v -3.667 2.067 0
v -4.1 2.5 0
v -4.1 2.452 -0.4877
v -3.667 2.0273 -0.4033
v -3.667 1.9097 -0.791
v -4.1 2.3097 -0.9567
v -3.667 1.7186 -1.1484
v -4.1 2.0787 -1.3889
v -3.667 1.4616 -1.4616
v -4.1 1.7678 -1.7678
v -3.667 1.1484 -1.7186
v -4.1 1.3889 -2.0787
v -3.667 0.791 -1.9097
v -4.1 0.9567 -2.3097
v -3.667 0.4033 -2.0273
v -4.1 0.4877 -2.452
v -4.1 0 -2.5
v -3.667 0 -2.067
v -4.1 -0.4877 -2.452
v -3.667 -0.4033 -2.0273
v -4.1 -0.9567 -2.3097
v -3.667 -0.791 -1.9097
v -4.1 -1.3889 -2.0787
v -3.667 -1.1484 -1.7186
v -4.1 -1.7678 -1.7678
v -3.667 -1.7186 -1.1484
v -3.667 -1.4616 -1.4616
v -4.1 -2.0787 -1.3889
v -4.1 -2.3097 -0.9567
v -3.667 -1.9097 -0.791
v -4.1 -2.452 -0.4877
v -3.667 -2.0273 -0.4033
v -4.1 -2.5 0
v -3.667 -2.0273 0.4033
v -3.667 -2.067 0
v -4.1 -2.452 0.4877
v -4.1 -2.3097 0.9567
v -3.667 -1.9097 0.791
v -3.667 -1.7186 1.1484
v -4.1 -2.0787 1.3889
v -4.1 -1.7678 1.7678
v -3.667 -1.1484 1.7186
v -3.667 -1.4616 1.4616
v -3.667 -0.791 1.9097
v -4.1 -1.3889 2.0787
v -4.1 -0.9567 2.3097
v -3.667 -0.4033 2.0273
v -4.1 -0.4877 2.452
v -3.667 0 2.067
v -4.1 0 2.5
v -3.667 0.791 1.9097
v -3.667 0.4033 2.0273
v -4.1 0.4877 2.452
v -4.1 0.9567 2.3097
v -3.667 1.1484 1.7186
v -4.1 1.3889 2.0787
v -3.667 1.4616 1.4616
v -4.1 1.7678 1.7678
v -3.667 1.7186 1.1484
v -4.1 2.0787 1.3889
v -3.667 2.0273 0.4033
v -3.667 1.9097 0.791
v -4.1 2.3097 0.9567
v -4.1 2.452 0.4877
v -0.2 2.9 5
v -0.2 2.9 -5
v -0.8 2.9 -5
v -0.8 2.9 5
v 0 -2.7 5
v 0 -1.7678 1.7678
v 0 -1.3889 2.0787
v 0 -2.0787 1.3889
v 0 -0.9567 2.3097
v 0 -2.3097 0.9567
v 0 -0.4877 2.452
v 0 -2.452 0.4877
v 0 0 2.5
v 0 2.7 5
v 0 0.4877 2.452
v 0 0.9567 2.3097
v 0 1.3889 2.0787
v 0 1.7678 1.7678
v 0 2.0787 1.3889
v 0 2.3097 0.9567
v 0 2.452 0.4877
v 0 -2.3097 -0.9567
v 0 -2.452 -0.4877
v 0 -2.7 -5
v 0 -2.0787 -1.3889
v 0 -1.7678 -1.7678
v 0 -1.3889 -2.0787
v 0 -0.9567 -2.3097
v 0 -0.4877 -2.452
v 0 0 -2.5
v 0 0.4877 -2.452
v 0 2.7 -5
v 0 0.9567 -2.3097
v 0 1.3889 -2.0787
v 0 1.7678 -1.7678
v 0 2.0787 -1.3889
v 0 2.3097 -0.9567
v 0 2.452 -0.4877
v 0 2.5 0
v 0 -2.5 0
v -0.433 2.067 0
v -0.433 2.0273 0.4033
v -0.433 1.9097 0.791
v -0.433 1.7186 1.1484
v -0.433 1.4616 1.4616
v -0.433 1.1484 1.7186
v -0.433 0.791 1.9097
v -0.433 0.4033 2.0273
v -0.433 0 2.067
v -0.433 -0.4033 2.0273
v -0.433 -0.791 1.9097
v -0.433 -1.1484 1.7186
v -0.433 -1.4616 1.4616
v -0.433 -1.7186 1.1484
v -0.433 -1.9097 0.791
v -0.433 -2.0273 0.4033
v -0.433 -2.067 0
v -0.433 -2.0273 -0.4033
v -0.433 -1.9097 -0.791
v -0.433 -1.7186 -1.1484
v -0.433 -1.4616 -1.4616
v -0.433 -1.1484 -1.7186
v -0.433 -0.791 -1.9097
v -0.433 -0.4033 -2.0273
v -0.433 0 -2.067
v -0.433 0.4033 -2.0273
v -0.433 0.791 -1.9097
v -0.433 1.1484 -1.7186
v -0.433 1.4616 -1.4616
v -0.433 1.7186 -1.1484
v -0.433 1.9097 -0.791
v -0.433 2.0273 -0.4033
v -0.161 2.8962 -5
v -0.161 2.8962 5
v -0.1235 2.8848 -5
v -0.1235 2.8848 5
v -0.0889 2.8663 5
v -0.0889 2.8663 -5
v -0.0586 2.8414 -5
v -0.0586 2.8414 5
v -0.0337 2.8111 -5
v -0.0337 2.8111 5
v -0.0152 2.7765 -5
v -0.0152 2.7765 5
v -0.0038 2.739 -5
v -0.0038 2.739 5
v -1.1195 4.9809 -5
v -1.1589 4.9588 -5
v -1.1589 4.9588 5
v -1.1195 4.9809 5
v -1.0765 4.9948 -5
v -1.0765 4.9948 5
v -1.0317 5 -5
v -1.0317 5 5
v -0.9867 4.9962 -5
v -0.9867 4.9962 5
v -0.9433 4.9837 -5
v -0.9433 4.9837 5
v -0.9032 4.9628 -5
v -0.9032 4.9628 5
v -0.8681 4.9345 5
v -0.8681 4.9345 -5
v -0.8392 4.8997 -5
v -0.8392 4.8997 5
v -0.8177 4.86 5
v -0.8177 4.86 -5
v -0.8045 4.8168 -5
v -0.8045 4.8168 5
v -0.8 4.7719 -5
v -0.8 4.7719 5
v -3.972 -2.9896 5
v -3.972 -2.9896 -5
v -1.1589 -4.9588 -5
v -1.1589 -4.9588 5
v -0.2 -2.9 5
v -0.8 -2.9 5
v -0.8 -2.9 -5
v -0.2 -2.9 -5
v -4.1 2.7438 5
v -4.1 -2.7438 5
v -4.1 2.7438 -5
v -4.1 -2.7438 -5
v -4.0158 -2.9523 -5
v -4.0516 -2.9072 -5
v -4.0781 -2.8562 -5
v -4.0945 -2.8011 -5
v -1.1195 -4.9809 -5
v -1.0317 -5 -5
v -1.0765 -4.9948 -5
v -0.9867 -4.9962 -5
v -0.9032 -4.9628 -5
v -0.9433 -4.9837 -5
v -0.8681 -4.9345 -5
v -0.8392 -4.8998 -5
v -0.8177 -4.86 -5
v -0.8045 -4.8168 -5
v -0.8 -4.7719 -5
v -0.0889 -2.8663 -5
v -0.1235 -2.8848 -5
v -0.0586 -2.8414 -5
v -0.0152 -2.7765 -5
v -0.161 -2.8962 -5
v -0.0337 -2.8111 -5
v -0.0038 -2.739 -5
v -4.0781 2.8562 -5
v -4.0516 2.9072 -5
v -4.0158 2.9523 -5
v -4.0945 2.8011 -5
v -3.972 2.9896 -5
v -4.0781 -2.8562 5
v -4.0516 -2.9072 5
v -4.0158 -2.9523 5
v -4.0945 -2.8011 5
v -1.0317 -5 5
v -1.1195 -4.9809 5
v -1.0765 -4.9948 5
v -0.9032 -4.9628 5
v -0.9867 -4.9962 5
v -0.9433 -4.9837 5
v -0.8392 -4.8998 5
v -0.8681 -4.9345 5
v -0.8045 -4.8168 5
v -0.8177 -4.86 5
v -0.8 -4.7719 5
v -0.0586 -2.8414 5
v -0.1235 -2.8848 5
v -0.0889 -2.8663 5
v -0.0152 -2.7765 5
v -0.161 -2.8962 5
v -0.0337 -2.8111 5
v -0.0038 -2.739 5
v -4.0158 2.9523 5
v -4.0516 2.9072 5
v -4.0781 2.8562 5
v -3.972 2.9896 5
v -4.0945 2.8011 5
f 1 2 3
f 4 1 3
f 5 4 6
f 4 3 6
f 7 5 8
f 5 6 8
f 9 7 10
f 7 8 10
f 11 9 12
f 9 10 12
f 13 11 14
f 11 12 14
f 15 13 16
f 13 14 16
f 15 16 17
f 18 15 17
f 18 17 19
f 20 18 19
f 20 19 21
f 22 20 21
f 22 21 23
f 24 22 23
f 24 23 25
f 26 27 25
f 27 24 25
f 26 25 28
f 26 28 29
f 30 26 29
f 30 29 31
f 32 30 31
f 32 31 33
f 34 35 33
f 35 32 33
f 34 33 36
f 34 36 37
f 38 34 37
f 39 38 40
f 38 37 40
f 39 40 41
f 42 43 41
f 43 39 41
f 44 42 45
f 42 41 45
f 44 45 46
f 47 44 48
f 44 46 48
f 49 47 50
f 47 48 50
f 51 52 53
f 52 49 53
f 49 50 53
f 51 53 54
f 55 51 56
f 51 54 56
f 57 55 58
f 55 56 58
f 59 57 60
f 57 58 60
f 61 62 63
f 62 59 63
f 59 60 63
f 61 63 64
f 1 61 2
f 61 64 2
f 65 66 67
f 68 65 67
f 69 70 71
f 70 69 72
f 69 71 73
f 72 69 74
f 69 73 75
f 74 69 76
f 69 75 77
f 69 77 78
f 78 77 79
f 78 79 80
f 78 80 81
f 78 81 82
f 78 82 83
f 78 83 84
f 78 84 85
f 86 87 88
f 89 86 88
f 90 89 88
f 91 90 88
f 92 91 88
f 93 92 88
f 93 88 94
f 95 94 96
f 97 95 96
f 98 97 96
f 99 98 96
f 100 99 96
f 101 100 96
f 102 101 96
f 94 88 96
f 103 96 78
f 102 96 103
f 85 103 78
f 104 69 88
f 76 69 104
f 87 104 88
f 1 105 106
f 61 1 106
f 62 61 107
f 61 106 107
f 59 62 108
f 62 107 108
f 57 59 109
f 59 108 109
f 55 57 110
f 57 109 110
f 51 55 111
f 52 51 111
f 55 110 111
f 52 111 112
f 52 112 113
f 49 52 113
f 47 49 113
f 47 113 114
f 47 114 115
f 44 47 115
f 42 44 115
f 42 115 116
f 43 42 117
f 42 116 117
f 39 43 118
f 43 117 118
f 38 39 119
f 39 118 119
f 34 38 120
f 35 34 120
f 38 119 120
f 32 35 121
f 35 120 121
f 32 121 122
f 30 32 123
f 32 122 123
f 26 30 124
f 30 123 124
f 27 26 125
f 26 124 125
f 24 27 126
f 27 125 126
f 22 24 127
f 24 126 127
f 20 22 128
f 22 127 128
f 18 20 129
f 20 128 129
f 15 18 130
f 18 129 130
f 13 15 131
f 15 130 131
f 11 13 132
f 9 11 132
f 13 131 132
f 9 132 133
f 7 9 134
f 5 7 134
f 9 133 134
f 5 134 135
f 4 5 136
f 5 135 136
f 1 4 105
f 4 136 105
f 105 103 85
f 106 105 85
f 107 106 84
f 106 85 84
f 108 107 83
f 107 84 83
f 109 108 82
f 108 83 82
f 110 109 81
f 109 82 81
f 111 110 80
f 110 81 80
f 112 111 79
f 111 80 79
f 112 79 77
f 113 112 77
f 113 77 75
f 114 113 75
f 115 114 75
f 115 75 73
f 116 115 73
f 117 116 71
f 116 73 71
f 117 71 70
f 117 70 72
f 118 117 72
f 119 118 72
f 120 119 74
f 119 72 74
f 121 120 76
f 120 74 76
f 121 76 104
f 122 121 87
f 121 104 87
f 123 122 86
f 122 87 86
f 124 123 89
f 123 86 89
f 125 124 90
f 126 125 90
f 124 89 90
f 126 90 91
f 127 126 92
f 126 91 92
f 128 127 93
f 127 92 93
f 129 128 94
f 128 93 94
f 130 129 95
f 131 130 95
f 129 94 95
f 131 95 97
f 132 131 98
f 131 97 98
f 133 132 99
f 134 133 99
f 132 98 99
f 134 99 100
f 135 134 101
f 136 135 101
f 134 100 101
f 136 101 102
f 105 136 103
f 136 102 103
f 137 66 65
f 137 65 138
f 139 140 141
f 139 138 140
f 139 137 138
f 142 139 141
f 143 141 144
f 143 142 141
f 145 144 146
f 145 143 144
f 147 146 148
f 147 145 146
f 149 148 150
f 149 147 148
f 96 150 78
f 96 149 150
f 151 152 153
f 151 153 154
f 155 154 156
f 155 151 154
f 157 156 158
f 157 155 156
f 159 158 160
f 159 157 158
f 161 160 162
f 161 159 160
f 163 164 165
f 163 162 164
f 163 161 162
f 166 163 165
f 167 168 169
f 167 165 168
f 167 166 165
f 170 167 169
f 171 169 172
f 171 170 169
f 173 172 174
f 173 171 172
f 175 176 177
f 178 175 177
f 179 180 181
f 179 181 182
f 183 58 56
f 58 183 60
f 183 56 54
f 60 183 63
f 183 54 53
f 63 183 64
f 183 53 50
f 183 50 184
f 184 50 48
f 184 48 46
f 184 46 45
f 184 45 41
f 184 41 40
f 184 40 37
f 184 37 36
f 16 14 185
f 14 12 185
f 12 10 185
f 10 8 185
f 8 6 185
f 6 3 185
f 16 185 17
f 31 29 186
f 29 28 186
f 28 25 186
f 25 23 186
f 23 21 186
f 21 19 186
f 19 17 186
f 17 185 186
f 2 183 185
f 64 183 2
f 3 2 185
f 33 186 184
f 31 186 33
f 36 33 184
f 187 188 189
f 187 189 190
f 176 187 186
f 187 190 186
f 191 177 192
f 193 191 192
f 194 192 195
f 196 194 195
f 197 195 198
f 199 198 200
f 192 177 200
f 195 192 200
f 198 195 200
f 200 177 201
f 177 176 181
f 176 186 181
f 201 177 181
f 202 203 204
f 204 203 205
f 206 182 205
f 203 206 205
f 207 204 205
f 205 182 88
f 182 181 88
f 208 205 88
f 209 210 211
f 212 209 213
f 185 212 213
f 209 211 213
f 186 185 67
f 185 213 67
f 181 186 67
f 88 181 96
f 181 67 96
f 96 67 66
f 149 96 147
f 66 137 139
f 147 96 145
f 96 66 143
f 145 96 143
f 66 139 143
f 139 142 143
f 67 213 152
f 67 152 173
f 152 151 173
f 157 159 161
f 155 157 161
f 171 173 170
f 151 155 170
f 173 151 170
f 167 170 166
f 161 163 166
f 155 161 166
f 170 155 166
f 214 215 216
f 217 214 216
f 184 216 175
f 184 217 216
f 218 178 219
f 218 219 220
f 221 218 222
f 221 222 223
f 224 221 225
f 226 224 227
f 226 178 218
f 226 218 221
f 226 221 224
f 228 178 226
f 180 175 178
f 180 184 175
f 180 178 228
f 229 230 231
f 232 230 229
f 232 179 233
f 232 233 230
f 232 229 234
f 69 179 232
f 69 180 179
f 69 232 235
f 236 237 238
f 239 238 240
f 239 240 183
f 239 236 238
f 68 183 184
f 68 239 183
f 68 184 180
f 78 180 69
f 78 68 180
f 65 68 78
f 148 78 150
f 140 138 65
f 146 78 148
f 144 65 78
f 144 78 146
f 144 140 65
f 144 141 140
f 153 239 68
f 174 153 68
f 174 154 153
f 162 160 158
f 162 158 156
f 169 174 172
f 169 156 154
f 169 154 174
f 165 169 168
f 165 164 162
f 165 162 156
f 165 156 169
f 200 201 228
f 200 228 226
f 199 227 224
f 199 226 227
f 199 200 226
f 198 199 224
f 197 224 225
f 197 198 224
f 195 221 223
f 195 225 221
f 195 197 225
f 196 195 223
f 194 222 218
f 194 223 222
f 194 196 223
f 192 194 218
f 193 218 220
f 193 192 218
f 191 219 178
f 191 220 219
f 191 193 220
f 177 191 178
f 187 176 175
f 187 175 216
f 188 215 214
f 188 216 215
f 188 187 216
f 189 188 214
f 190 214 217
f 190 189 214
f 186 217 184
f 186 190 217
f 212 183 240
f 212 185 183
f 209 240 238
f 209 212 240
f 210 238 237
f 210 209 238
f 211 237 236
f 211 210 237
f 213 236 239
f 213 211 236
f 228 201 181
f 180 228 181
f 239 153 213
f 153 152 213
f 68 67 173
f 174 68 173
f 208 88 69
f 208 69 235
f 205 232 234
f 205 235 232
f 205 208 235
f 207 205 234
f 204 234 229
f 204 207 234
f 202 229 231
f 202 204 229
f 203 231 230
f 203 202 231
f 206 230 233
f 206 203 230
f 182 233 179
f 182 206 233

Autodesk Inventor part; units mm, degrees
sketch "Sketch_2" plane through (0, 0, 0) normal (0, 0, 1) x (1, 0, 0)
  arc A0 (-4.1, -2.7438) -> (-3.972, -2.9896) centre (-3.8, -2.7438) ccw
  line L0 (-3.972, -2.9896) -> (-1.1589, -4.9588)
  arc A1 (-1.1589, -4.9588) -> (-0.8, -4.7719) centre (-1.0281, -4.7719) ccw
  line L1 (-0.8, -4.7719) -> (-0.8, -2.9)
  line L2 (-0.8, -2.9) -> (-0.2, -2.9)
  arc A2 (-0.2, -2.9) -> (0, -2.7) centre (-0.2, -2.7) ccw
  line L3 (0, -2.7) -> (0, 2.7)
  arc A3 (0, 2.7) -> (-0.2, 2.9) centre (-0.2, 2.7) ccw
  line L4 (-0.2, 2.9) -> (-0.8, 2.9)
  line L5 (-0.8, 2.9) -> (-0.8, 4.7719)
  arc A4 (-0.8, 4.7719) -> (-1.1589, 4.9588) centre (-1.0281, 4.7719) ccw
  line L6 (-1.1589, 4.9588) -> (-3.972, 2.9896)
  arc A5 (-3.972, 2.9896) -> (-4.1, 2.7438) centre (-3.8, 2.7438) ccw
  line L7 (-4.1, 2.7438) -> (-4.1, -2.7438)
extrude "Extrusion1" add sketch "Sketch_2" along normal mid plane 10
sketch "Sketch_5" plane through (0, 0, 0) normal (0, 0, 1) x (1, 0, 0)
  line L0 (0, 0) -> (-4.1, 0)
  line L1 (-4.1, 0) -> (-4.1, 2.5)
  line L2 (-4.1, 2.5) -> (-3.667, 2.067)
  line L3 (-3.667, 2.067) -> (-0.433, 2.067)
  line L4 (-0.433, 2.067) -> (0, 2.5)
  line L5 (0, 2.5) -> (0, 0)
  line L6 (0, 0) -> (-4.1, 0)
revolve "Revolution1" cut sketch "Sketch_5" angle 360 about axis through (0, 0, 0) along (1, 0, 0)
thread "Thread1" size "M5x0.8" class "6H" standard "ISO Metric profile" full length
ref_plane "nut_XY" through (0, 0, 0) normal (1, 0, 0) x (0, 0, -1)
ref_plane "nut_YZ" through (0, 0, 0) normal (0, 0, -1) x (0, 1, 0)
ref_plane "nut_ZX" through (0, 0, 0) normal (0, 1, 0) x (1, 0, 0)
ref_plane "to_bolt_XY" through (-4.1, 0, 0) normal (1, 0, 0) x (0, 0, -1)
ref_plane "to_bolt_YZ" through (-4.1, 0, 0) normal (0, 0, -1) x (0, 1, 0)
ref_plane "to_bolt_ZX" through (-4.1, 0, 0) normal (0, 1, 0) x (1, 0, 0)
ref_plane "to_frames_XY" through (-0.8, 0, 0) normal (1, 0, 0) x (0, 0, -1)
ref_plane "to_frames_YZ" through (-0.8, 0, 0) normal (0, 0, -1) x (0, 1, 0)
ref_plane "to_frames_ZX" through (-0.8, 0, 0) normal (0, 1, 0) x (1, 0, 0)
ref_plane "to_lane_XY" through (0, 0, 0) normal (0, 0, 1) x (1, 0, 0)
ref_plane "to_lane_YZ" through (0, 0, 0) normal (1, 0, 0) x (0, 1, 0)
ref_plane "to_lane_ZX" through (0, 0, 0) normal (0, 1, 0) x (0, 0, 1)
properties part number "HNTTSS5-5"
